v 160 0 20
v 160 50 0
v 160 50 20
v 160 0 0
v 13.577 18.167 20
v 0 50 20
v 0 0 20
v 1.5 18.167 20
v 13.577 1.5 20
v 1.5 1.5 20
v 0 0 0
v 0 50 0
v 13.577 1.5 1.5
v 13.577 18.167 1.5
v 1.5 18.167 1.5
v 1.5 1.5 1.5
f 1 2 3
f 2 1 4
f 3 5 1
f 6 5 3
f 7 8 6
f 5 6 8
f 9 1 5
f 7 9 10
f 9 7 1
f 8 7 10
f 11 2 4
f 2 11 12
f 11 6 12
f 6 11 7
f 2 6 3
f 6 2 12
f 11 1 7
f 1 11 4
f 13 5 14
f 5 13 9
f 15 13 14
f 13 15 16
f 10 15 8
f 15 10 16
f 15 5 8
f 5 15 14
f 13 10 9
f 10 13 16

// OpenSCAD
//palette 
length=160;
width=50;

depthMax=20;
depthMin=5;

wallThickness=1.5;

panY=width/3;
panX=(length-wallThickness*2)/13;

module base() {
    difference() {
        cube([length,width,depthMax]);
        union() {
            translate([panX/2*0+wallThickness,wallThickness,wallThickness]) cube([panX,panY,depthMax]);
        }
    }
}

base();
